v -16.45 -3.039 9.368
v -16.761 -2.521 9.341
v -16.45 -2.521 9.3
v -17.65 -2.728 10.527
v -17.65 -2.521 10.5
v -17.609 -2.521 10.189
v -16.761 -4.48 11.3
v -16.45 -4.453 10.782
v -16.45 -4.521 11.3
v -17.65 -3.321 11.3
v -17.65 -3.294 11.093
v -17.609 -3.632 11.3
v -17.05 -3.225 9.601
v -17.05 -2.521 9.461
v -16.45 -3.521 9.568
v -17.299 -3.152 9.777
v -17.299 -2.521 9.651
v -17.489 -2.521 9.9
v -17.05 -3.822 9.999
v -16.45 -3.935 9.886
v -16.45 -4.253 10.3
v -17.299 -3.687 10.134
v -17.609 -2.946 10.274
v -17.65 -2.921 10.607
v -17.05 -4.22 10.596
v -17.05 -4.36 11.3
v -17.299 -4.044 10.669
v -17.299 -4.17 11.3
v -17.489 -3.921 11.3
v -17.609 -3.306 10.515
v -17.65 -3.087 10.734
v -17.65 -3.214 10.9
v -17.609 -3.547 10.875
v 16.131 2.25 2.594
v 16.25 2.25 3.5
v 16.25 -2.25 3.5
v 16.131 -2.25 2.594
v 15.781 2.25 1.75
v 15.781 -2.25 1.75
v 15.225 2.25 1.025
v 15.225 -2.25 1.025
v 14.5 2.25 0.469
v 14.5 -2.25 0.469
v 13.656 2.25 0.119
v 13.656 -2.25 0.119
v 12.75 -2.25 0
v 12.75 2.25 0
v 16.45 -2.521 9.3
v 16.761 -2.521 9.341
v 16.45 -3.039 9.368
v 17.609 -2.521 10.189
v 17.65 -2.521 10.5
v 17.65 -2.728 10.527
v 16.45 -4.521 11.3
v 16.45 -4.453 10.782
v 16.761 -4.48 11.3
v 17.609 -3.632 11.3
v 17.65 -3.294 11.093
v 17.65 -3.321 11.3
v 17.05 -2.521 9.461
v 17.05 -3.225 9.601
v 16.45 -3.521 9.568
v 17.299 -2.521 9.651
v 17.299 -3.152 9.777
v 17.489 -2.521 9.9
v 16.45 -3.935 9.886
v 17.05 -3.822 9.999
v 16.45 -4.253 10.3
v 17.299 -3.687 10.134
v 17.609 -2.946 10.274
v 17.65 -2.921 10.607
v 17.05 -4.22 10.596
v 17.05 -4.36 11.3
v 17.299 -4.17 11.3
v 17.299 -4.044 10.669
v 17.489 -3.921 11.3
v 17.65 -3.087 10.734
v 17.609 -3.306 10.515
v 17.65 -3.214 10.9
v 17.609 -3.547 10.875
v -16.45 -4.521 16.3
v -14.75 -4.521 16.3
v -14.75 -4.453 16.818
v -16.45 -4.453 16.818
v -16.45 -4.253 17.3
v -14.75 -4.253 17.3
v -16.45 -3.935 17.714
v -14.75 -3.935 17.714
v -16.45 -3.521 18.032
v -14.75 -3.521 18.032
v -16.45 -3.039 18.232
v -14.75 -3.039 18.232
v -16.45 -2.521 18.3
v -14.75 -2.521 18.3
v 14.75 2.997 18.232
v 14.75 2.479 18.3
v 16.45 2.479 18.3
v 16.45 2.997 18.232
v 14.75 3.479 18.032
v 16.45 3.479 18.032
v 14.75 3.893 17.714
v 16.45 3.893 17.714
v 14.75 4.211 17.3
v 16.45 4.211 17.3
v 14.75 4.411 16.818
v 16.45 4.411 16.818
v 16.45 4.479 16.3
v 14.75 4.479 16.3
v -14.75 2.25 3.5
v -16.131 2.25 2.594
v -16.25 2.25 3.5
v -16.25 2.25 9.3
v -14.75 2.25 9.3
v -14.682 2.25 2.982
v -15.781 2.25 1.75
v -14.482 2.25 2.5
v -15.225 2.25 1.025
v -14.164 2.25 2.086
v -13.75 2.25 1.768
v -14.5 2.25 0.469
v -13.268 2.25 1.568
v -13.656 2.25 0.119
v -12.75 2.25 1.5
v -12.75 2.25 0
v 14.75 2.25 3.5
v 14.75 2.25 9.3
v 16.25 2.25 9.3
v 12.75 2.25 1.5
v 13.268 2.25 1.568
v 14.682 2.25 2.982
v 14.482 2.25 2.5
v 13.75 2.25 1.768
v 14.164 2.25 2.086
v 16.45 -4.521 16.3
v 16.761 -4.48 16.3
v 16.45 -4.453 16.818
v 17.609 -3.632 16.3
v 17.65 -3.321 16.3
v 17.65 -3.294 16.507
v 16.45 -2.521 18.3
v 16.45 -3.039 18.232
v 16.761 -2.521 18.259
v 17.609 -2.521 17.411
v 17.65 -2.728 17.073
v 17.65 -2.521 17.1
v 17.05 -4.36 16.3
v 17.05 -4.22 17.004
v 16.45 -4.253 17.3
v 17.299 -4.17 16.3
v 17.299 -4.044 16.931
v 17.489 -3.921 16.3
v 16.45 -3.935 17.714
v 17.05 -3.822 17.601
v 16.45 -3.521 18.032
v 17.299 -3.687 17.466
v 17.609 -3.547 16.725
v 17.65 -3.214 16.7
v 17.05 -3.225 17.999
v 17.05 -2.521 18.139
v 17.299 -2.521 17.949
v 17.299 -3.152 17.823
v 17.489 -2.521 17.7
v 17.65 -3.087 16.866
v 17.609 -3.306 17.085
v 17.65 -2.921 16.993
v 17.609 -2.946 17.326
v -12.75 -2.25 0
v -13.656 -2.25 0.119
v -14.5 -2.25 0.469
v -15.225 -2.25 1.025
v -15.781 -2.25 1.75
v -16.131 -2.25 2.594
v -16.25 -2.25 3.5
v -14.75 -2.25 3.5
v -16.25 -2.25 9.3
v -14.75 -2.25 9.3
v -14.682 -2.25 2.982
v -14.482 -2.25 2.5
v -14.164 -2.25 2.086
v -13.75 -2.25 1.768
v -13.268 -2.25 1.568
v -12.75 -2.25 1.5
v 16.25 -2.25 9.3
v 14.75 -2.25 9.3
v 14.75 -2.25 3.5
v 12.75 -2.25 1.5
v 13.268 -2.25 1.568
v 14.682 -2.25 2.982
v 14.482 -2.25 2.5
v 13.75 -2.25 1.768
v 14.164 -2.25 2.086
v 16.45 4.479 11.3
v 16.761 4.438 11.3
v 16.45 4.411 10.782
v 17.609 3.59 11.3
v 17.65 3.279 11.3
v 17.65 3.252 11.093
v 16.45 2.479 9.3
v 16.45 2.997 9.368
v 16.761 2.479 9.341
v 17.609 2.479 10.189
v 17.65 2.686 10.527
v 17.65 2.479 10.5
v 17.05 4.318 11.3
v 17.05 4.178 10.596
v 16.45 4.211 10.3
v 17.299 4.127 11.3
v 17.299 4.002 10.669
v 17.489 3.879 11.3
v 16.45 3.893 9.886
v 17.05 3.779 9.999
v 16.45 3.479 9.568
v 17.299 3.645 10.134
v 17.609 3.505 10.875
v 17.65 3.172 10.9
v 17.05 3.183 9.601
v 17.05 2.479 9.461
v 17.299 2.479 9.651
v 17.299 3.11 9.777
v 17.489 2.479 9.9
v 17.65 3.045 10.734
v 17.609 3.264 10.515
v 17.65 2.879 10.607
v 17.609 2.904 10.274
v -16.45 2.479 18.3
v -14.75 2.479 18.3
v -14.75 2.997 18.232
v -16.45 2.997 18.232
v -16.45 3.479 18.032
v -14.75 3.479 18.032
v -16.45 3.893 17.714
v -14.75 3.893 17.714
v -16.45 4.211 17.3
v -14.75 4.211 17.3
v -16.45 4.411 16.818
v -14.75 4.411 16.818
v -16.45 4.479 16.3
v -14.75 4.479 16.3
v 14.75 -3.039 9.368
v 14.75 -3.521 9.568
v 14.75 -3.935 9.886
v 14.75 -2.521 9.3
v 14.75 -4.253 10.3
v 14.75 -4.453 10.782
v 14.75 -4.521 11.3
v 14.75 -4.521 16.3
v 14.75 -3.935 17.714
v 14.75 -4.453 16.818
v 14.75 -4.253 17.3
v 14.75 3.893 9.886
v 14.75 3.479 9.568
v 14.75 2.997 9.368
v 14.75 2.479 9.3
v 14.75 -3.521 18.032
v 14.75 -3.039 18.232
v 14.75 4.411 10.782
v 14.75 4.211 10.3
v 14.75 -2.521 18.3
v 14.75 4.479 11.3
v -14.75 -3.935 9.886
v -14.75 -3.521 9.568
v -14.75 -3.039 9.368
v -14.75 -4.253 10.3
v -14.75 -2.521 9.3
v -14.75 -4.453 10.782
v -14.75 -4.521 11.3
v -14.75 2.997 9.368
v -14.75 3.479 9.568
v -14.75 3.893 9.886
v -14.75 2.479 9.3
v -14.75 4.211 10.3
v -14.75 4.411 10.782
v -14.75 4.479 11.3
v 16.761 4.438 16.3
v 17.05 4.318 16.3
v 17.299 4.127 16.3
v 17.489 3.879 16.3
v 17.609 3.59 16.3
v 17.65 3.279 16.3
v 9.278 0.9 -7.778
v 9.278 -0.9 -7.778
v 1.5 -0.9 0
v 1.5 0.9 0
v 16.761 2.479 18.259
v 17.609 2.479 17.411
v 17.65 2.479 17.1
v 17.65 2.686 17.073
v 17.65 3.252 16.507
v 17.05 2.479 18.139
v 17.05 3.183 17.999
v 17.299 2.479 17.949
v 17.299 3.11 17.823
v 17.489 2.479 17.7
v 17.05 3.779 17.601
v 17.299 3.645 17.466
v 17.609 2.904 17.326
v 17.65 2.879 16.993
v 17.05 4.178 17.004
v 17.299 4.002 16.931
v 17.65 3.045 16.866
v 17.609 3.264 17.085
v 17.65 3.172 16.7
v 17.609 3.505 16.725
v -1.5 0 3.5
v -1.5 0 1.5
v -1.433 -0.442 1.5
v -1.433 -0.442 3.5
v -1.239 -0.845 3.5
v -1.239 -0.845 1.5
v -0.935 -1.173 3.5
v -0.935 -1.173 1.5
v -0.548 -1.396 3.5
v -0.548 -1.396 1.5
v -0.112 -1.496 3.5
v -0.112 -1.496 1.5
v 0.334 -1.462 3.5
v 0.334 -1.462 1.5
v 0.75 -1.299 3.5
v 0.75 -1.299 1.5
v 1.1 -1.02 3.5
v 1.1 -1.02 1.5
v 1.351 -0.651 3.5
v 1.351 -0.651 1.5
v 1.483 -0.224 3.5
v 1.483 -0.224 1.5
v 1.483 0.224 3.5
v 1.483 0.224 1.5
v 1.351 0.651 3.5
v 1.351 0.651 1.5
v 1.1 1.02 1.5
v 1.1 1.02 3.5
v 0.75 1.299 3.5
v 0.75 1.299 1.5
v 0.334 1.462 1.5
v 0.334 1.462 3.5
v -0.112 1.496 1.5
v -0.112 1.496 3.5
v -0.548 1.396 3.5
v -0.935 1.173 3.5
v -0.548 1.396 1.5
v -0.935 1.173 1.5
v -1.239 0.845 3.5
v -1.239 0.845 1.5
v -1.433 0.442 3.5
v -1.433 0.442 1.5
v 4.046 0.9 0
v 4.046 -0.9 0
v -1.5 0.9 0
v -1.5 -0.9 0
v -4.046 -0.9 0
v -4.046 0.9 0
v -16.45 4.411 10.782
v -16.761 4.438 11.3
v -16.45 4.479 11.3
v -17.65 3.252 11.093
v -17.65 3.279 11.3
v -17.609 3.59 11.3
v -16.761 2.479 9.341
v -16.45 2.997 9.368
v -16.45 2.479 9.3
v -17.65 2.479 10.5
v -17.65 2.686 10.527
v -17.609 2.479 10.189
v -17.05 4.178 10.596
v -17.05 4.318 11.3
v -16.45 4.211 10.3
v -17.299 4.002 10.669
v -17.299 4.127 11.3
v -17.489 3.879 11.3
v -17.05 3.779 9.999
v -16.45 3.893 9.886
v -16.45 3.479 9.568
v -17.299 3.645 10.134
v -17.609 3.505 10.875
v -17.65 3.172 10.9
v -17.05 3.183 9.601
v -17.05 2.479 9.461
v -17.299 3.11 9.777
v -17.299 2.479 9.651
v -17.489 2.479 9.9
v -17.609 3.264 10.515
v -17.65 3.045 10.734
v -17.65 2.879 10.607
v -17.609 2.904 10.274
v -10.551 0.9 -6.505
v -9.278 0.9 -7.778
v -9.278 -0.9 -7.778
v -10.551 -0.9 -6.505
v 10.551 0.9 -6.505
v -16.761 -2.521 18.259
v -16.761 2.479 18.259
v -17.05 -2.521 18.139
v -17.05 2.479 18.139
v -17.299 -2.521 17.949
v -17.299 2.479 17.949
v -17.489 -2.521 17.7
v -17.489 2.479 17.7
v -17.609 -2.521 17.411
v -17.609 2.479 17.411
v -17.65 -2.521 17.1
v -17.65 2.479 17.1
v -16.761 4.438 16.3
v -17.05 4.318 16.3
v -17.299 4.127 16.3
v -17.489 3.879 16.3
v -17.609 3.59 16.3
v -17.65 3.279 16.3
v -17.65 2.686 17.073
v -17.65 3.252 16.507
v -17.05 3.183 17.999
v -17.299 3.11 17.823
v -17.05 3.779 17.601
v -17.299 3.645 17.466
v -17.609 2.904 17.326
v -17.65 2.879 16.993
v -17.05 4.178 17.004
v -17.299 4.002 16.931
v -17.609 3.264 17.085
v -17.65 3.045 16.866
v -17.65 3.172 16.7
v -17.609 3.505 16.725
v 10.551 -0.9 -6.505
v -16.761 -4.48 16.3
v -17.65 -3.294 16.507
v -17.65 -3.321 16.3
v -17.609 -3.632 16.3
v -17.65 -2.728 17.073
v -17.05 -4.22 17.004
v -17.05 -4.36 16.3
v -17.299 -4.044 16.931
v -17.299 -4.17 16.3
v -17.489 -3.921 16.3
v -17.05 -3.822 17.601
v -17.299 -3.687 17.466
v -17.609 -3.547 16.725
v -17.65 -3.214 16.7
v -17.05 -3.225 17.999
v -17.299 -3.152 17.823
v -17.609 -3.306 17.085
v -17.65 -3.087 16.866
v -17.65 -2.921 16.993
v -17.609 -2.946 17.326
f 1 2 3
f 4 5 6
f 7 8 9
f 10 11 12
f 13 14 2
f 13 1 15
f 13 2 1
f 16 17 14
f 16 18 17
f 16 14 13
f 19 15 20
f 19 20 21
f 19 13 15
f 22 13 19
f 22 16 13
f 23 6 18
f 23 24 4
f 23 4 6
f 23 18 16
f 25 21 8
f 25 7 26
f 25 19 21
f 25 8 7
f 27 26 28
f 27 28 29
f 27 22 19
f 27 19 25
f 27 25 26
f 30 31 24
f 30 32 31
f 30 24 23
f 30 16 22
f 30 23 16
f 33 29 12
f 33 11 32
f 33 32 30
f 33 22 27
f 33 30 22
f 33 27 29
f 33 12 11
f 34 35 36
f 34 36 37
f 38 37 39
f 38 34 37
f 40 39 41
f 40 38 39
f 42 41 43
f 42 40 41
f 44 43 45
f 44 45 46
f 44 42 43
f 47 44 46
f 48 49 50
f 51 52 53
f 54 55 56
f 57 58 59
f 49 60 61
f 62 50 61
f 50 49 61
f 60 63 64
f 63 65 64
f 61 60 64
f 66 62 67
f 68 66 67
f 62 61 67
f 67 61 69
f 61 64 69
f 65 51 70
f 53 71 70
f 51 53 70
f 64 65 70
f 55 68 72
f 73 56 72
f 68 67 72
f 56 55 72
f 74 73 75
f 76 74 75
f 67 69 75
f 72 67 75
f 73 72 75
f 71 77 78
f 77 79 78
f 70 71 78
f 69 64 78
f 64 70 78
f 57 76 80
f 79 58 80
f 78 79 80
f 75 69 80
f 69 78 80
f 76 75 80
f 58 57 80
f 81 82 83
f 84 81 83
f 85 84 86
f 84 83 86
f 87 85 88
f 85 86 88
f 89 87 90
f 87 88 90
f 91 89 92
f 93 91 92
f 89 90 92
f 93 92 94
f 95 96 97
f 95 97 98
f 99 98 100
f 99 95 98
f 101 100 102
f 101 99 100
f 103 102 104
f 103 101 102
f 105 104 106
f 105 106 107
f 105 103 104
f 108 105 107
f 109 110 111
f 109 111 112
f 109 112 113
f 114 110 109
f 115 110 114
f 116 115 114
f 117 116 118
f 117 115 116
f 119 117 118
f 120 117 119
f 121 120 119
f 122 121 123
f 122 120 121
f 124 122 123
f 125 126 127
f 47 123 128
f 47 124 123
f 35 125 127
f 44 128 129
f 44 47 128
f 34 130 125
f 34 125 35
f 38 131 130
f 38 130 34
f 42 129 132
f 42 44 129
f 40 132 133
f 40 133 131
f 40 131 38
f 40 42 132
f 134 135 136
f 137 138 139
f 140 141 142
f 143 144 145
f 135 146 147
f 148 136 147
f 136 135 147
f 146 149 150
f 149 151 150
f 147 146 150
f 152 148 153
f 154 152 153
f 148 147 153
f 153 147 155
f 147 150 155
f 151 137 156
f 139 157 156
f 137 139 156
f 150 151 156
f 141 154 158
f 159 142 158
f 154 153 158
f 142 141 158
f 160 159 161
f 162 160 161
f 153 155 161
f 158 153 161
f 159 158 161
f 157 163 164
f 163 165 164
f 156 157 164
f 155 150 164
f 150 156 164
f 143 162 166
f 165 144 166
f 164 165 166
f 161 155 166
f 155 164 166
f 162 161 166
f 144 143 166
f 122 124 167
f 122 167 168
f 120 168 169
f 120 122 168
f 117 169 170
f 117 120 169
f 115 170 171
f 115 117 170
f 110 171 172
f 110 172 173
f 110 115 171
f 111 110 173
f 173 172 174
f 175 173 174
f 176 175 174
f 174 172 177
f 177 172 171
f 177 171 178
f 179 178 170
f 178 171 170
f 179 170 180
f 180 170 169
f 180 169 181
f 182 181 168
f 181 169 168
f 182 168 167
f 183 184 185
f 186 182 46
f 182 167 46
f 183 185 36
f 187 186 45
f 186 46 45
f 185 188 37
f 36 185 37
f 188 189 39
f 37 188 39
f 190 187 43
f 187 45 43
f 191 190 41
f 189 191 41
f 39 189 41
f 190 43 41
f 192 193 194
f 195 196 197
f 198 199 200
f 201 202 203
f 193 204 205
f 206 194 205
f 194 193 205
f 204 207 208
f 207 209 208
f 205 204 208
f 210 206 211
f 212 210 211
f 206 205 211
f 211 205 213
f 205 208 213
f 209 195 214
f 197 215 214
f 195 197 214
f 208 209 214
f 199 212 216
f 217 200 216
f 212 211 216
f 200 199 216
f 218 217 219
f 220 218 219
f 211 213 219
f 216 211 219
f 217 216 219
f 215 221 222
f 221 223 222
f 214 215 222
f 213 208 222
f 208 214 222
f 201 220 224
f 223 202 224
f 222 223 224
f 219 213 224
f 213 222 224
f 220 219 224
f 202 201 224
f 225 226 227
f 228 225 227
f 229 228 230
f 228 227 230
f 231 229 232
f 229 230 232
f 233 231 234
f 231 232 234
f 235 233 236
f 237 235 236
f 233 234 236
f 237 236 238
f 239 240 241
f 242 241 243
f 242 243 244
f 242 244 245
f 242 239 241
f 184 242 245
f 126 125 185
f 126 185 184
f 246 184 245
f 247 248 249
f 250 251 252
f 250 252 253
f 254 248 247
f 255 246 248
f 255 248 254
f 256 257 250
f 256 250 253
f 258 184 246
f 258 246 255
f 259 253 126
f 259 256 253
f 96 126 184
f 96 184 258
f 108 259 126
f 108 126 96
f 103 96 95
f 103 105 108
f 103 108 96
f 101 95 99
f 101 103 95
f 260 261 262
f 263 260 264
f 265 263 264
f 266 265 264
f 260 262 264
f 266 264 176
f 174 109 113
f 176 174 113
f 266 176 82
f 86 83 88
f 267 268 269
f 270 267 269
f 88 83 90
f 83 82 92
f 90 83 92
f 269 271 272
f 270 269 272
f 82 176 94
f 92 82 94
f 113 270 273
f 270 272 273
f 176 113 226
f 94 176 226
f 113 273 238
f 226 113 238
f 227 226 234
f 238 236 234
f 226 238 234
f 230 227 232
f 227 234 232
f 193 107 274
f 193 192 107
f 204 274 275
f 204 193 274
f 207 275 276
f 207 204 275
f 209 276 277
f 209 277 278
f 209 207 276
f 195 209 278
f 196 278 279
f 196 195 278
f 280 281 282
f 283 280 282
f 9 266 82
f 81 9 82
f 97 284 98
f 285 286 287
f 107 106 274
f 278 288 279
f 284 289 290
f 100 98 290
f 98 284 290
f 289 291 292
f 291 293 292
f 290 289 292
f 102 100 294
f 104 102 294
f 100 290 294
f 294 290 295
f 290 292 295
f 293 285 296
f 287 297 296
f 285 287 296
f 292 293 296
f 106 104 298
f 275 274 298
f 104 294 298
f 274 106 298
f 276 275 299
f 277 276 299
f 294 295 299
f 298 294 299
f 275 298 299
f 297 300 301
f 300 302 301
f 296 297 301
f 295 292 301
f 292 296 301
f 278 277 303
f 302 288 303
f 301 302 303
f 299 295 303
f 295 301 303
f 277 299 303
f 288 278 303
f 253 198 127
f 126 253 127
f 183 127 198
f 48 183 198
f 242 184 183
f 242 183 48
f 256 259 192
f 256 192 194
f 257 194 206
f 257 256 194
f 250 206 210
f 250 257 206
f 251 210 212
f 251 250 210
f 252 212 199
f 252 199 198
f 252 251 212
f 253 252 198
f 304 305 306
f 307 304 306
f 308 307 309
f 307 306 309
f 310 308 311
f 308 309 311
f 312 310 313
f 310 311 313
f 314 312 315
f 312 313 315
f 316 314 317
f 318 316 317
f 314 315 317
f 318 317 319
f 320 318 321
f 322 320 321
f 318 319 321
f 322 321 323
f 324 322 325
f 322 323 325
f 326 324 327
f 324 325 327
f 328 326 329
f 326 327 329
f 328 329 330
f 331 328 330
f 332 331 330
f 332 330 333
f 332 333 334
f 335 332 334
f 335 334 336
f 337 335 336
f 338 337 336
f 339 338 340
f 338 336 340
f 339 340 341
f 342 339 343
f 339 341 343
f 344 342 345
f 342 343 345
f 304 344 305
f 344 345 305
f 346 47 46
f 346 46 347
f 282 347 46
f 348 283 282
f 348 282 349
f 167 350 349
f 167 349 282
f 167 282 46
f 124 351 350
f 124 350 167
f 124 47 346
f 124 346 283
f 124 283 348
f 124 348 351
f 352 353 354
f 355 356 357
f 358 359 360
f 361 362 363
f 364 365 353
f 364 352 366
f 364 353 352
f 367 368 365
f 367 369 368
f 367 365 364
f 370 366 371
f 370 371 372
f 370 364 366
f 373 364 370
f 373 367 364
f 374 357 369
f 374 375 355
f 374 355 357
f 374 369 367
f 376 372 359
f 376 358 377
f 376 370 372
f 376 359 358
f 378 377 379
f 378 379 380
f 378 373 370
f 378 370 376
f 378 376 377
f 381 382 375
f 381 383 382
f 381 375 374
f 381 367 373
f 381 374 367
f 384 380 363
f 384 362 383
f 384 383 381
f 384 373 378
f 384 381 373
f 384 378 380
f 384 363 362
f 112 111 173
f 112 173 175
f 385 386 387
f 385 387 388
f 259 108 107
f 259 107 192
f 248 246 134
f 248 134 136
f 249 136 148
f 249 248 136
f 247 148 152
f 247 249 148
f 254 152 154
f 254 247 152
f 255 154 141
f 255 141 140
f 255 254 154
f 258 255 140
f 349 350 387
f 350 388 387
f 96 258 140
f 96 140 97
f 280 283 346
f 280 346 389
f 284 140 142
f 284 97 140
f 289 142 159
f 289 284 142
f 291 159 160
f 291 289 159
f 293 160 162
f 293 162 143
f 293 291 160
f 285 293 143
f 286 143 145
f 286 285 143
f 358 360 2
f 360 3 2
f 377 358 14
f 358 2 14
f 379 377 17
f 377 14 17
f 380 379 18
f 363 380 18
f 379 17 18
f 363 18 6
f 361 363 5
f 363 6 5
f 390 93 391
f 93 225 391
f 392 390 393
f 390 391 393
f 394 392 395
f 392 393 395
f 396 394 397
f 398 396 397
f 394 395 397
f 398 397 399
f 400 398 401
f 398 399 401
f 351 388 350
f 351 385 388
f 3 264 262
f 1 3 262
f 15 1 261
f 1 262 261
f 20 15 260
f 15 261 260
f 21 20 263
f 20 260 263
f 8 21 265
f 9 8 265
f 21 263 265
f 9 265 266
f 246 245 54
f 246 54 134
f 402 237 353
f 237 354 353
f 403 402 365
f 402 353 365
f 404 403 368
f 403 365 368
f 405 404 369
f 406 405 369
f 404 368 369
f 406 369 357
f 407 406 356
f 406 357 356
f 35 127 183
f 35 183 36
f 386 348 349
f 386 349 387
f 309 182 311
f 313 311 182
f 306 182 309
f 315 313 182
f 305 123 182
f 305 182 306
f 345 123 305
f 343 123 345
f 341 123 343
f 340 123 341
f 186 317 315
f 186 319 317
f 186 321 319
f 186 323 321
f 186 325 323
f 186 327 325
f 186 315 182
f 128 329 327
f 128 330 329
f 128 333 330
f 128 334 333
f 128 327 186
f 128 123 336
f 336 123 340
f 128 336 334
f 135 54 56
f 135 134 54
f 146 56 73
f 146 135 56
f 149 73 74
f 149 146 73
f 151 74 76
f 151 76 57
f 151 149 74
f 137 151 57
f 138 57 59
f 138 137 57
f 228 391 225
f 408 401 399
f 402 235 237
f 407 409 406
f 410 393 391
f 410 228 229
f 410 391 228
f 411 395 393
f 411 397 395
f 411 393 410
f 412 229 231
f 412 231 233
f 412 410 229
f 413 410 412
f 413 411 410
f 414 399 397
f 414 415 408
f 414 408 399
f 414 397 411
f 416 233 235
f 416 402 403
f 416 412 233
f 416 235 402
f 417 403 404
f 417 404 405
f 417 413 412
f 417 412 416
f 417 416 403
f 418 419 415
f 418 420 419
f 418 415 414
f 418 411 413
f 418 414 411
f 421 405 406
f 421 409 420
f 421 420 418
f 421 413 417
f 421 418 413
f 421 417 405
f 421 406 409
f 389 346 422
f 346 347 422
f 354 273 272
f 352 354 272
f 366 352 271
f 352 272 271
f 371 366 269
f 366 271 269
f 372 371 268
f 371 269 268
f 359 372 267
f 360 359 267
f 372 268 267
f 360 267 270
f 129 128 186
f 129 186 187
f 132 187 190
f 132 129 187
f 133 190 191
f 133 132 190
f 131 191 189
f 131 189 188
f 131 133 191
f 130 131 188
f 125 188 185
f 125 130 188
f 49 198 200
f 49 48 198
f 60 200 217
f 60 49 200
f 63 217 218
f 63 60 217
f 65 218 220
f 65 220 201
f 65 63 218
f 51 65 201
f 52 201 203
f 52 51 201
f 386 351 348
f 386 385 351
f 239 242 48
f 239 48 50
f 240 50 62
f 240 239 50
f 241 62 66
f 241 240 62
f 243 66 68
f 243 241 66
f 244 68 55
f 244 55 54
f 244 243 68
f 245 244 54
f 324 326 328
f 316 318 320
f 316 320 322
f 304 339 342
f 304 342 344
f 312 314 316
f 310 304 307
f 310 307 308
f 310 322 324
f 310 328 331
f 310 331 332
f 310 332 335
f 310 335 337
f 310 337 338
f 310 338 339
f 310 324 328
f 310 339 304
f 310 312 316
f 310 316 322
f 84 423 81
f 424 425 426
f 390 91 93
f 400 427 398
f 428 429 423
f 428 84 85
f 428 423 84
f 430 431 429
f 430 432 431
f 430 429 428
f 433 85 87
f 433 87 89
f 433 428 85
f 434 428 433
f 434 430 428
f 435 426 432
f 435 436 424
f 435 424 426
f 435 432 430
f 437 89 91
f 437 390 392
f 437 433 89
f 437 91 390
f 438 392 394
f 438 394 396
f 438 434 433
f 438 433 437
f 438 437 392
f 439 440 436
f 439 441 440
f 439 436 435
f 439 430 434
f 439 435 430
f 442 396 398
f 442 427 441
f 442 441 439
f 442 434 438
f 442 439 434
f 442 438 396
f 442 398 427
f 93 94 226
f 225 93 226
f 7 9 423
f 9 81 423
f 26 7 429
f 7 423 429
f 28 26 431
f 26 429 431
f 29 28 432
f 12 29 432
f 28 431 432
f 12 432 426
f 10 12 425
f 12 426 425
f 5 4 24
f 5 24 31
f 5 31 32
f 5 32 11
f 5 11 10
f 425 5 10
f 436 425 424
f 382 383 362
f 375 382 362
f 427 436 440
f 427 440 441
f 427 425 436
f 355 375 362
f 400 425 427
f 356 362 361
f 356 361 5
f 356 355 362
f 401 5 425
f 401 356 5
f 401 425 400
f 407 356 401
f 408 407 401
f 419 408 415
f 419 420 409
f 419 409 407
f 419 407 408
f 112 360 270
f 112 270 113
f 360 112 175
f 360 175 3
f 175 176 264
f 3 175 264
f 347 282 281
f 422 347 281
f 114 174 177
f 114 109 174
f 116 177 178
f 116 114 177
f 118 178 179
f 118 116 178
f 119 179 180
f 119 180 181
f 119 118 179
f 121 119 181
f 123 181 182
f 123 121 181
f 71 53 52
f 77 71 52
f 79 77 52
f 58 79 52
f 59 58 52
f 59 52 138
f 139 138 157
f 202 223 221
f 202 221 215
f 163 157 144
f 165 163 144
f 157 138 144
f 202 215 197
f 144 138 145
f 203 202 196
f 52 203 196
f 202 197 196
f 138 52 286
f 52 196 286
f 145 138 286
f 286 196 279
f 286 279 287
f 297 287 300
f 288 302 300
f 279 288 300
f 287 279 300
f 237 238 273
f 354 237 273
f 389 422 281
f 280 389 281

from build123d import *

# Parameters (mm, degrees)
EXTRUDE_2_DEPTH        = 2.25
EXTRUDE_4_DEPTH        = 0.9
EXTRUDE_5_DEPTH        = 2.9
FILLET_1_R             = 1.2
FILLET_1_OF_MIRROR_2_R = 1.2
SKETCH_3_R             = 1.5
EXTRUDE_6_DEPTH        = 2


with BuildPart() as part:
    # 草图1 → 凸台-拉伸2 (new, symmetric)
    with BuildSketch(Plane(origin=(0, 0, 0), x_dir=(1, 0, 0), z_dir=(0, 1, 0))):
        with BuildLine():
            Line((-12.75, -1.5), (12.75, -1.5))
            ThreePointArc((12.75, -1.5), (14.164213562, -2.085786438), (14.75, -3.5))
            Line((14.75, -3.5), (14.75, -9.3))
            Line((14.75, -9.3), (16.25, -9.3))
            Line((16.25, -9.3), (16.25, -3.5))
            ThreePointArc((16.25, -3.5), (15.224873734, -1.025126266), (12.75, 0))
            Line((12.75, 0), (-12.75, 0))
            ThreePointArc((-12.75, 0), (-15.224873734, -1.025126266), (-16.25, -3.5))
            Line((-16.25, -3.5), (-16.25, -9.3))
            Line((-16.25, -9.3), (-14.75, -9.3))
            Line((-14.75, -9.3), (-14.75, -3.5))
            ThreePointArc((-14.75, -3.5), (-14.164213562, -2.085786438), (-12.75, -1.5))
        make_face()
    extrude(amount=EXTRUDE_2_DEPTH, both=True)

    # 草图1<6> → 凸台-拉伸4 (add, symmetric)
    with BuildSketch(Plane(origin=(0, 0, 0), x_dir=(1, 0, 0), z_dir=(0, 1, 0))):
        Polygon((-4.045584412, 0), (-1.5, 0), (-9.278174593, 7.778174593), (-10.550966799, 6.505382387), align=None)
        Polygon((9.278174593, 7.778174593), (1.5, 0), (4.045584412, 0), (10.550966799, 6.505382387), align=None)
    extrude(amount=EXTRUDE_4_DEPTH, both=True)

    # 草图2 → 凸台-拉伸5 (add)
    with BuildSketch(Plane.ZY.offset(-14.75)):
        with BuildLine():
            Line((16.3, 4.478921871), (11.3, 4.478921871))
            ThreePointArc((11.3, 4.478921871), (9.885786438, 3.893135433), (9.3, 2.478921871))
            Line((9.3, 2.478921871), (9.3, -2.521078129))
            ThreePointArc((9.3, -2.521078129), (9.885786438, -3.935291691), (11.3, -4.521078129))
            Line((11.3, -4.521078129), (16.3, -4.521078129))
            ThreePointArc((16.3, -4.521078129), (17.714213562, -3.935291691), (18.3, -2.521078129))
            Line((18.3, -2.521078129), (18.3, 2.478921871))
            ThreePointArc((18.3, 2.478921871), (17.714213562, 3.893135433), (16.3, 4.478921871))
        make_face()
    extrude_5 = extrude(amount=-EXTRUDE_5_DEPTH)

    # 圆角1
    fillet_1_edges = [part.edges().sort_by_distance(p)[0] for p in [
        (17.65, -0.021078129, 9.3),
        (17.65, -3.935291691, 9.885786438),
        (17.65, -4.521078129, 13.8),
        (17.65, -3.935291691, 17.714213562),
        (17.65, -0.021078129, 18.3),
        (17.65, 3.893135433, 17.714213562),
        (17.65, 4.478921871, 13.8),
        (17.65, 3.893135433, 9.885786438),
    ]]
    fillet(fillet_1_edges, radius=FILLET_1_R)

    # 镜向2: 凸台-拉伸5 across plane
    add(extrude_5.mirror(Plane(origin=(0, 0, 0), x_dir=(0, 0, 1), z_dir=(1, 0, 0))))

    # 圆角1 of 镜向2
    fillet_1_of_mirror_2_edges = [part.edges().sort_by_distance(p)[0] for p in [
        (-17.65, -0.021078129, 9.3),
        (-17.65, -3.935291691, 9.885786438),
        (-17.65, -4.521078129, 13.8),
        (-17.65, -3.935291691, 17.714213562),
        (-17.65, -0.021078129, 18.3),
        (-17.65, 3.893135433, 17.714213562),
        (-17.65, 4.478921871, 13.8),
        (-17.65, 3.893135433, 9.885786438),
    ]]
    fillet(fillet_1_of_mirror_2_edges, radius=FILLET_1_OF_MIRROR_2_R)

    # 草图3 → 凸台-拉伸6 (add)
    with BuildSketch(Plane.XY.offset(1.5)):
        Circle(SKETCH_3_R)
    extrude(amount=EXTRUDE_6_DEPTH)


solid = part.part
